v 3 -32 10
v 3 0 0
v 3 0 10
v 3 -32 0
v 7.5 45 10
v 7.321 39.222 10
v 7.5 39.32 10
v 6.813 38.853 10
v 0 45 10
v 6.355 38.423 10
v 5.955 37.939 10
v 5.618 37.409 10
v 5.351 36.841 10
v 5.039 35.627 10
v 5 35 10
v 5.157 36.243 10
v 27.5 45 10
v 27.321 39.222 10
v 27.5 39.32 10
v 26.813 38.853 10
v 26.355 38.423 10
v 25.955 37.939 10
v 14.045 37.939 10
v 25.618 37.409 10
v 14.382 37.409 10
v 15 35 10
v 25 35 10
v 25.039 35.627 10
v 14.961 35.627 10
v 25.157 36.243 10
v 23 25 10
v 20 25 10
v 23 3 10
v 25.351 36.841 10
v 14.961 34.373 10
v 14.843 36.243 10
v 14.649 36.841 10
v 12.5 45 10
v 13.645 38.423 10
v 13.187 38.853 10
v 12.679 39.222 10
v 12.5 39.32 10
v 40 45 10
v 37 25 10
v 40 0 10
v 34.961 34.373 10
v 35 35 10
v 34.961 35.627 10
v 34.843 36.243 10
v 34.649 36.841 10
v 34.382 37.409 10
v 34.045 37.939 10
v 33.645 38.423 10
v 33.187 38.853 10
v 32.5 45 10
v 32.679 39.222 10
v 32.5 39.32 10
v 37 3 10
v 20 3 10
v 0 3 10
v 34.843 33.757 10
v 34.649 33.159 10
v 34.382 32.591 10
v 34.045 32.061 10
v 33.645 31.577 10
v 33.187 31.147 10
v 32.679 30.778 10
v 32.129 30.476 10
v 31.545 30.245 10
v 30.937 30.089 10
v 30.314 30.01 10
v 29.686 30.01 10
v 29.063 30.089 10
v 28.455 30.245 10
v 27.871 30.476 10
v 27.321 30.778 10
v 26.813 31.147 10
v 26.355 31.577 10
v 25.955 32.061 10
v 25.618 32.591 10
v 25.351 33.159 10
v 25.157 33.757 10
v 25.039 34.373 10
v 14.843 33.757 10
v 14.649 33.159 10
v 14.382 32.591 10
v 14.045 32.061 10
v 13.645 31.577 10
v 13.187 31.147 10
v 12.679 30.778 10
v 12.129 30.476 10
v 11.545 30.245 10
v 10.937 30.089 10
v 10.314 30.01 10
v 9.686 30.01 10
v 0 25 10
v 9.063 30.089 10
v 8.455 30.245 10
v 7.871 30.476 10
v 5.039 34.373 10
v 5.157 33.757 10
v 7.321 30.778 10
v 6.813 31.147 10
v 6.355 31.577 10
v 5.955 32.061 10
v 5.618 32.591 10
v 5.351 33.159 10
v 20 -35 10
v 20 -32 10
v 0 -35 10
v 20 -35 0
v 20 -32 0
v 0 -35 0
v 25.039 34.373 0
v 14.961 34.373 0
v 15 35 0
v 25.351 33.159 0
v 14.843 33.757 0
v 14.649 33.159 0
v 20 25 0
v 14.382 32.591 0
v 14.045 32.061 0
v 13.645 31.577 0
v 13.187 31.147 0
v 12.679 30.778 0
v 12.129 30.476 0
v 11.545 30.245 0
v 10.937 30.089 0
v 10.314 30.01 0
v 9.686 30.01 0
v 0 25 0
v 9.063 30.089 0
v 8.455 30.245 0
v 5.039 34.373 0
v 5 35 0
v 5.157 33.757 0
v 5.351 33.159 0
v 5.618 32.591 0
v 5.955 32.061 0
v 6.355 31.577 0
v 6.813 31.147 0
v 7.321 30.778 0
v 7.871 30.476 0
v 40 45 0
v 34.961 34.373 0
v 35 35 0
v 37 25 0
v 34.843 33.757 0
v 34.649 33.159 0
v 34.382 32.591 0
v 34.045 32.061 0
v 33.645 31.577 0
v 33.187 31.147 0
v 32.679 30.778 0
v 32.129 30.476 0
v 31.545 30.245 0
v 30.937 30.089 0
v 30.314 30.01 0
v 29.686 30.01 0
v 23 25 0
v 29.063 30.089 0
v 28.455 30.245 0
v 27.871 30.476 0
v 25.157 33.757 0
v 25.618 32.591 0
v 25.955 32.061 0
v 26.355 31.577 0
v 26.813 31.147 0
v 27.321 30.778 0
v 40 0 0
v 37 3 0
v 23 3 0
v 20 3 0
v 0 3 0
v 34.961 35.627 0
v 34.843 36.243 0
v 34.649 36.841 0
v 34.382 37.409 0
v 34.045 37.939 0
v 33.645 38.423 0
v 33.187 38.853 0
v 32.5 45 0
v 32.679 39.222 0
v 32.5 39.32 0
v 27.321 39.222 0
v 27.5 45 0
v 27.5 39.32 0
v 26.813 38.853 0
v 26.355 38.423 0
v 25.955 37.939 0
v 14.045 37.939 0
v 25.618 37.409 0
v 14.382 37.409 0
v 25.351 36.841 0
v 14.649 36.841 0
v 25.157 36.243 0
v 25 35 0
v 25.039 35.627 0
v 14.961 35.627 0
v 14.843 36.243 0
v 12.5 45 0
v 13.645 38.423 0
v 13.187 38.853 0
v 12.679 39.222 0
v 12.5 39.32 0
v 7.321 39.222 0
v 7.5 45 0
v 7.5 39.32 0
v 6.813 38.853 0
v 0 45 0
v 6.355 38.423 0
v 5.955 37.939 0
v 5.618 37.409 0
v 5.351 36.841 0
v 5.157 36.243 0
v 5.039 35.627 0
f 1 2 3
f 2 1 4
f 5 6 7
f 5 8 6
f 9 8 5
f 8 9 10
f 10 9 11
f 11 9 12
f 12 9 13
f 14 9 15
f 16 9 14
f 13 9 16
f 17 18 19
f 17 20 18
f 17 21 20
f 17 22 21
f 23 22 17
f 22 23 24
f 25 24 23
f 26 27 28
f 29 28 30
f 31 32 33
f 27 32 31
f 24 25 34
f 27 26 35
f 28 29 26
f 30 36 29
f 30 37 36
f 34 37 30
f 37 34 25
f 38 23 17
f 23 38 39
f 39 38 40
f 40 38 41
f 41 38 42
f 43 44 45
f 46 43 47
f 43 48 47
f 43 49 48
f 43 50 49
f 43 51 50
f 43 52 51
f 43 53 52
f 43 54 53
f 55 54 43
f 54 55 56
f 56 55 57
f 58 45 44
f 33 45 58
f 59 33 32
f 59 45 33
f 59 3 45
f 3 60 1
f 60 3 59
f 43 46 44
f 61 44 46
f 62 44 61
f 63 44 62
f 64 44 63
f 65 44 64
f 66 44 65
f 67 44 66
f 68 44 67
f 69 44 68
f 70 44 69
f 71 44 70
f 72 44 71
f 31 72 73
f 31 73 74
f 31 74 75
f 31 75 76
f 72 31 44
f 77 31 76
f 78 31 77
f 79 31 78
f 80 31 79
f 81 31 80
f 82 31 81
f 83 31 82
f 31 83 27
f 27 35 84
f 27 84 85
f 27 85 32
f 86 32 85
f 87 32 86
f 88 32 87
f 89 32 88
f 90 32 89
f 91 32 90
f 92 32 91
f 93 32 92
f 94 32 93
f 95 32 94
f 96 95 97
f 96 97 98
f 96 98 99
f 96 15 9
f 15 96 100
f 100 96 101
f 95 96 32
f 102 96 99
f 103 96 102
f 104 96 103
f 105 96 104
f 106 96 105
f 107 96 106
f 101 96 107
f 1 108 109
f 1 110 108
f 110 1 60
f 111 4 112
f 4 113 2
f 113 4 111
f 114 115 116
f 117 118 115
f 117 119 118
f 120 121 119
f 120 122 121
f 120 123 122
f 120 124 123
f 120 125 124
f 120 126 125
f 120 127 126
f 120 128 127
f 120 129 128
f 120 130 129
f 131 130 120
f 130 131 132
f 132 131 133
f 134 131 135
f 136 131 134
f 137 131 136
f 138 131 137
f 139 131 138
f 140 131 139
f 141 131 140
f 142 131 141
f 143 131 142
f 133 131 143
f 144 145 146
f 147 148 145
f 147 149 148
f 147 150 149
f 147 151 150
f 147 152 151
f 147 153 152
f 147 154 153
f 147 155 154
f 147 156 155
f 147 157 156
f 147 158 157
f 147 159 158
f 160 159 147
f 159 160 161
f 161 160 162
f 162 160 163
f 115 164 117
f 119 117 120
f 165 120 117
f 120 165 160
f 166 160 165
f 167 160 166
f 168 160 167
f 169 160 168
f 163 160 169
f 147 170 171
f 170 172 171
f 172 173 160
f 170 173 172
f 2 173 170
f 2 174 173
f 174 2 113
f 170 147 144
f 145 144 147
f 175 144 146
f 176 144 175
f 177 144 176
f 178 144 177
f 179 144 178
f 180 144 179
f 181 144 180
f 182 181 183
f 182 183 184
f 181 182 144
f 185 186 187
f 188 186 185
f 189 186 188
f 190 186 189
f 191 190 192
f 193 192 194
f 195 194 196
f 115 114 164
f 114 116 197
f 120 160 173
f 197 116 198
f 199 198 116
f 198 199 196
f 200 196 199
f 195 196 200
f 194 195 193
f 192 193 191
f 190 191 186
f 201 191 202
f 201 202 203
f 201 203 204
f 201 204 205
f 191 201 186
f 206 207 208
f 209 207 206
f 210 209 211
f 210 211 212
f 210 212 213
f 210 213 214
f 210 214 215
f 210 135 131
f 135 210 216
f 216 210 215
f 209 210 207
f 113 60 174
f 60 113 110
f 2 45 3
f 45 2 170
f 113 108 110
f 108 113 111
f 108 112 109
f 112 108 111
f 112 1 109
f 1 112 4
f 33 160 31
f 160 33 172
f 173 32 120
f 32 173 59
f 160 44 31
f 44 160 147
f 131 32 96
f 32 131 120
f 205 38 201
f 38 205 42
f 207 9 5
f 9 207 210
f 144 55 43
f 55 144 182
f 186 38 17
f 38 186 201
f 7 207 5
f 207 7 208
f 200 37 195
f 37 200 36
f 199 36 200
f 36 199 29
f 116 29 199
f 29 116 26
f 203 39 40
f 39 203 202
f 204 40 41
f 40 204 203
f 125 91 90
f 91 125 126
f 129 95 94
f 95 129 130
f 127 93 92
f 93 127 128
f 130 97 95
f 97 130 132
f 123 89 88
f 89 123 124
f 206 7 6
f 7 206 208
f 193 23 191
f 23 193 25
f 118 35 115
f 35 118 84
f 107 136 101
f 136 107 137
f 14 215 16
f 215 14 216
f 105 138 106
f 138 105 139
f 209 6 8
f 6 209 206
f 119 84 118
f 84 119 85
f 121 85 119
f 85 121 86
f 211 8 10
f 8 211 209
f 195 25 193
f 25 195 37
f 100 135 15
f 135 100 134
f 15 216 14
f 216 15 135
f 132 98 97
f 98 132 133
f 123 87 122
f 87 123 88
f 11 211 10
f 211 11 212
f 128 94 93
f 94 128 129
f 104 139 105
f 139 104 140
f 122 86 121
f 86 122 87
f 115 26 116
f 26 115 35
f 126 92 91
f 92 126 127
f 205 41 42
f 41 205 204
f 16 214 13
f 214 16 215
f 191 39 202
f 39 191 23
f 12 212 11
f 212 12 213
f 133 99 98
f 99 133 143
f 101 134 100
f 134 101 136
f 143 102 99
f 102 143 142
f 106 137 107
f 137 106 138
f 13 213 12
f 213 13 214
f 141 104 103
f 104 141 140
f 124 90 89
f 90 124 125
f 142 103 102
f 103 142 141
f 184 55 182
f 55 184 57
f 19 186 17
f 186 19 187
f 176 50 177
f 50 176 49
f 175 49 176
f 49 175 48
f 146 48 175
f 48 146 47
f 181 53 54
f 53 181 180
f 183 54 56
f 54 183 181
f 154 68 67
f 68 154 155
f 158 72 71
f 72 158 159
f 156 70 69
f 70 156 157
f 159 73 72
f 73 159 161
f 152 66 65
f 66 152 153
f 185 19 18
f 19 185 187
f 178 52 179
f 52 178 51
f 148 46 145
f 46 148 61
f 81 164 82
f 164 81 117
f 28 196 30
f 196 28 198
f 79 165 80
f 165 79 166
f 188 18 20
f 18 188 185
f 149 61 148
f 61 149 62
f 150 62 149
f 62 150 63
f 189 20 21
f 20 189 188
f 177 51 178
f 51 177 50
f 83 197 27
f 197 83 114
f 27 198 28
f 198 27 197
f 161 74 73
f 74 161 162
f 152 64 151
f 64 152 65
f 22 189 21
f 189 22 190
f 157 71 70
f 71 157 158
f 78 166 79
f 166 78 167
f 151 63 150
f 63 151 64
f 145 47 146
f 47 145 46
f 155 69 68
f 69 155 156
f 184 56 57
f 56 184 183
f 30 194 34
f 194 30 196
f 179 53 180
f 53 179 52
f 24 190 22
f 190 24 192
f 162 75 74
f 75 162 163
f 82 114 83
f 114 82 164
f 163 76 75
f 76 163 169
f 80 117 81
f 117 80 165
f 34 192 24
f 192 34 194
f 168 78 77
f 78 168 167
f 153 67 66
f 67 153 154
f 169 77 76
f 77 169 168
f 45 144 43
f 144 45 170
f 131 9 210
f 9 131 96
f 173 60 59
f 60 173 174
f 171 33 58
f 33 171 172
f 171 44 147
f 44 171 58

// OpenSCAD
wall = 3;
height = 10;
wire = 5;

complete();
//wire_holder(wall, height, wire);
module complete()
{
	translate([0, -35, 0]) {
		monitor_hook(wall, height);
	}

	main_beam(wall, height);

	translate([20, 0, 0]) {
		top_L(wall, height);
	}

	translate([0, 25, 0]) {
		wire_holder(20, height, wire);
	}

	translate([40 - wall, 0, 0]) {
		cube([wall, 25, height]);
	}

}

module main_beam(wall, height)
{
	cube([40, wall, height]);
}

module monitor_hook(wall, height)
{
	cube([wall, 35, height]);
	cube([20, wall, height]);
}

module top_L(wall, height)
{
	cube([wall, 25, height]);
	translate([-10, 25, 0]) {
		cube([10 + wall, wall, height]);
	}
}

module bottom_L(wall, height)
{
	cube([wall, 25, height]);
	translate([0, 25, 0]) {
		cube([10, wall, height]);
	}
}

module wire_holder(wall, height, wire)
{
	down = -5;

	difference()
	{
		cube([40, wall, height]);

		translate([10, wall * .5, down]) {
			rotate([270, 0, 0]) {
				keyhole(wall * 3, wire);
			}
		}
		translate([30, wall * .5, down]) {
			rotate([270, 0, 0]) {
				keyhole(wall * 3, wire);
			}
		}
	}
}


module keyhole(wall, entrance_width)
{
	hole_diameter = entrance_width * 2;
	translate([- hole_diameter / 4, -wall, 0]) {
		cube([entrance_width, wall, hole_diameter]);
	}
	rotate([90, 0, 0]) {
		cylinder(r = hole_diameter / 2, h = wall, $fn = 50 );
	}
}
